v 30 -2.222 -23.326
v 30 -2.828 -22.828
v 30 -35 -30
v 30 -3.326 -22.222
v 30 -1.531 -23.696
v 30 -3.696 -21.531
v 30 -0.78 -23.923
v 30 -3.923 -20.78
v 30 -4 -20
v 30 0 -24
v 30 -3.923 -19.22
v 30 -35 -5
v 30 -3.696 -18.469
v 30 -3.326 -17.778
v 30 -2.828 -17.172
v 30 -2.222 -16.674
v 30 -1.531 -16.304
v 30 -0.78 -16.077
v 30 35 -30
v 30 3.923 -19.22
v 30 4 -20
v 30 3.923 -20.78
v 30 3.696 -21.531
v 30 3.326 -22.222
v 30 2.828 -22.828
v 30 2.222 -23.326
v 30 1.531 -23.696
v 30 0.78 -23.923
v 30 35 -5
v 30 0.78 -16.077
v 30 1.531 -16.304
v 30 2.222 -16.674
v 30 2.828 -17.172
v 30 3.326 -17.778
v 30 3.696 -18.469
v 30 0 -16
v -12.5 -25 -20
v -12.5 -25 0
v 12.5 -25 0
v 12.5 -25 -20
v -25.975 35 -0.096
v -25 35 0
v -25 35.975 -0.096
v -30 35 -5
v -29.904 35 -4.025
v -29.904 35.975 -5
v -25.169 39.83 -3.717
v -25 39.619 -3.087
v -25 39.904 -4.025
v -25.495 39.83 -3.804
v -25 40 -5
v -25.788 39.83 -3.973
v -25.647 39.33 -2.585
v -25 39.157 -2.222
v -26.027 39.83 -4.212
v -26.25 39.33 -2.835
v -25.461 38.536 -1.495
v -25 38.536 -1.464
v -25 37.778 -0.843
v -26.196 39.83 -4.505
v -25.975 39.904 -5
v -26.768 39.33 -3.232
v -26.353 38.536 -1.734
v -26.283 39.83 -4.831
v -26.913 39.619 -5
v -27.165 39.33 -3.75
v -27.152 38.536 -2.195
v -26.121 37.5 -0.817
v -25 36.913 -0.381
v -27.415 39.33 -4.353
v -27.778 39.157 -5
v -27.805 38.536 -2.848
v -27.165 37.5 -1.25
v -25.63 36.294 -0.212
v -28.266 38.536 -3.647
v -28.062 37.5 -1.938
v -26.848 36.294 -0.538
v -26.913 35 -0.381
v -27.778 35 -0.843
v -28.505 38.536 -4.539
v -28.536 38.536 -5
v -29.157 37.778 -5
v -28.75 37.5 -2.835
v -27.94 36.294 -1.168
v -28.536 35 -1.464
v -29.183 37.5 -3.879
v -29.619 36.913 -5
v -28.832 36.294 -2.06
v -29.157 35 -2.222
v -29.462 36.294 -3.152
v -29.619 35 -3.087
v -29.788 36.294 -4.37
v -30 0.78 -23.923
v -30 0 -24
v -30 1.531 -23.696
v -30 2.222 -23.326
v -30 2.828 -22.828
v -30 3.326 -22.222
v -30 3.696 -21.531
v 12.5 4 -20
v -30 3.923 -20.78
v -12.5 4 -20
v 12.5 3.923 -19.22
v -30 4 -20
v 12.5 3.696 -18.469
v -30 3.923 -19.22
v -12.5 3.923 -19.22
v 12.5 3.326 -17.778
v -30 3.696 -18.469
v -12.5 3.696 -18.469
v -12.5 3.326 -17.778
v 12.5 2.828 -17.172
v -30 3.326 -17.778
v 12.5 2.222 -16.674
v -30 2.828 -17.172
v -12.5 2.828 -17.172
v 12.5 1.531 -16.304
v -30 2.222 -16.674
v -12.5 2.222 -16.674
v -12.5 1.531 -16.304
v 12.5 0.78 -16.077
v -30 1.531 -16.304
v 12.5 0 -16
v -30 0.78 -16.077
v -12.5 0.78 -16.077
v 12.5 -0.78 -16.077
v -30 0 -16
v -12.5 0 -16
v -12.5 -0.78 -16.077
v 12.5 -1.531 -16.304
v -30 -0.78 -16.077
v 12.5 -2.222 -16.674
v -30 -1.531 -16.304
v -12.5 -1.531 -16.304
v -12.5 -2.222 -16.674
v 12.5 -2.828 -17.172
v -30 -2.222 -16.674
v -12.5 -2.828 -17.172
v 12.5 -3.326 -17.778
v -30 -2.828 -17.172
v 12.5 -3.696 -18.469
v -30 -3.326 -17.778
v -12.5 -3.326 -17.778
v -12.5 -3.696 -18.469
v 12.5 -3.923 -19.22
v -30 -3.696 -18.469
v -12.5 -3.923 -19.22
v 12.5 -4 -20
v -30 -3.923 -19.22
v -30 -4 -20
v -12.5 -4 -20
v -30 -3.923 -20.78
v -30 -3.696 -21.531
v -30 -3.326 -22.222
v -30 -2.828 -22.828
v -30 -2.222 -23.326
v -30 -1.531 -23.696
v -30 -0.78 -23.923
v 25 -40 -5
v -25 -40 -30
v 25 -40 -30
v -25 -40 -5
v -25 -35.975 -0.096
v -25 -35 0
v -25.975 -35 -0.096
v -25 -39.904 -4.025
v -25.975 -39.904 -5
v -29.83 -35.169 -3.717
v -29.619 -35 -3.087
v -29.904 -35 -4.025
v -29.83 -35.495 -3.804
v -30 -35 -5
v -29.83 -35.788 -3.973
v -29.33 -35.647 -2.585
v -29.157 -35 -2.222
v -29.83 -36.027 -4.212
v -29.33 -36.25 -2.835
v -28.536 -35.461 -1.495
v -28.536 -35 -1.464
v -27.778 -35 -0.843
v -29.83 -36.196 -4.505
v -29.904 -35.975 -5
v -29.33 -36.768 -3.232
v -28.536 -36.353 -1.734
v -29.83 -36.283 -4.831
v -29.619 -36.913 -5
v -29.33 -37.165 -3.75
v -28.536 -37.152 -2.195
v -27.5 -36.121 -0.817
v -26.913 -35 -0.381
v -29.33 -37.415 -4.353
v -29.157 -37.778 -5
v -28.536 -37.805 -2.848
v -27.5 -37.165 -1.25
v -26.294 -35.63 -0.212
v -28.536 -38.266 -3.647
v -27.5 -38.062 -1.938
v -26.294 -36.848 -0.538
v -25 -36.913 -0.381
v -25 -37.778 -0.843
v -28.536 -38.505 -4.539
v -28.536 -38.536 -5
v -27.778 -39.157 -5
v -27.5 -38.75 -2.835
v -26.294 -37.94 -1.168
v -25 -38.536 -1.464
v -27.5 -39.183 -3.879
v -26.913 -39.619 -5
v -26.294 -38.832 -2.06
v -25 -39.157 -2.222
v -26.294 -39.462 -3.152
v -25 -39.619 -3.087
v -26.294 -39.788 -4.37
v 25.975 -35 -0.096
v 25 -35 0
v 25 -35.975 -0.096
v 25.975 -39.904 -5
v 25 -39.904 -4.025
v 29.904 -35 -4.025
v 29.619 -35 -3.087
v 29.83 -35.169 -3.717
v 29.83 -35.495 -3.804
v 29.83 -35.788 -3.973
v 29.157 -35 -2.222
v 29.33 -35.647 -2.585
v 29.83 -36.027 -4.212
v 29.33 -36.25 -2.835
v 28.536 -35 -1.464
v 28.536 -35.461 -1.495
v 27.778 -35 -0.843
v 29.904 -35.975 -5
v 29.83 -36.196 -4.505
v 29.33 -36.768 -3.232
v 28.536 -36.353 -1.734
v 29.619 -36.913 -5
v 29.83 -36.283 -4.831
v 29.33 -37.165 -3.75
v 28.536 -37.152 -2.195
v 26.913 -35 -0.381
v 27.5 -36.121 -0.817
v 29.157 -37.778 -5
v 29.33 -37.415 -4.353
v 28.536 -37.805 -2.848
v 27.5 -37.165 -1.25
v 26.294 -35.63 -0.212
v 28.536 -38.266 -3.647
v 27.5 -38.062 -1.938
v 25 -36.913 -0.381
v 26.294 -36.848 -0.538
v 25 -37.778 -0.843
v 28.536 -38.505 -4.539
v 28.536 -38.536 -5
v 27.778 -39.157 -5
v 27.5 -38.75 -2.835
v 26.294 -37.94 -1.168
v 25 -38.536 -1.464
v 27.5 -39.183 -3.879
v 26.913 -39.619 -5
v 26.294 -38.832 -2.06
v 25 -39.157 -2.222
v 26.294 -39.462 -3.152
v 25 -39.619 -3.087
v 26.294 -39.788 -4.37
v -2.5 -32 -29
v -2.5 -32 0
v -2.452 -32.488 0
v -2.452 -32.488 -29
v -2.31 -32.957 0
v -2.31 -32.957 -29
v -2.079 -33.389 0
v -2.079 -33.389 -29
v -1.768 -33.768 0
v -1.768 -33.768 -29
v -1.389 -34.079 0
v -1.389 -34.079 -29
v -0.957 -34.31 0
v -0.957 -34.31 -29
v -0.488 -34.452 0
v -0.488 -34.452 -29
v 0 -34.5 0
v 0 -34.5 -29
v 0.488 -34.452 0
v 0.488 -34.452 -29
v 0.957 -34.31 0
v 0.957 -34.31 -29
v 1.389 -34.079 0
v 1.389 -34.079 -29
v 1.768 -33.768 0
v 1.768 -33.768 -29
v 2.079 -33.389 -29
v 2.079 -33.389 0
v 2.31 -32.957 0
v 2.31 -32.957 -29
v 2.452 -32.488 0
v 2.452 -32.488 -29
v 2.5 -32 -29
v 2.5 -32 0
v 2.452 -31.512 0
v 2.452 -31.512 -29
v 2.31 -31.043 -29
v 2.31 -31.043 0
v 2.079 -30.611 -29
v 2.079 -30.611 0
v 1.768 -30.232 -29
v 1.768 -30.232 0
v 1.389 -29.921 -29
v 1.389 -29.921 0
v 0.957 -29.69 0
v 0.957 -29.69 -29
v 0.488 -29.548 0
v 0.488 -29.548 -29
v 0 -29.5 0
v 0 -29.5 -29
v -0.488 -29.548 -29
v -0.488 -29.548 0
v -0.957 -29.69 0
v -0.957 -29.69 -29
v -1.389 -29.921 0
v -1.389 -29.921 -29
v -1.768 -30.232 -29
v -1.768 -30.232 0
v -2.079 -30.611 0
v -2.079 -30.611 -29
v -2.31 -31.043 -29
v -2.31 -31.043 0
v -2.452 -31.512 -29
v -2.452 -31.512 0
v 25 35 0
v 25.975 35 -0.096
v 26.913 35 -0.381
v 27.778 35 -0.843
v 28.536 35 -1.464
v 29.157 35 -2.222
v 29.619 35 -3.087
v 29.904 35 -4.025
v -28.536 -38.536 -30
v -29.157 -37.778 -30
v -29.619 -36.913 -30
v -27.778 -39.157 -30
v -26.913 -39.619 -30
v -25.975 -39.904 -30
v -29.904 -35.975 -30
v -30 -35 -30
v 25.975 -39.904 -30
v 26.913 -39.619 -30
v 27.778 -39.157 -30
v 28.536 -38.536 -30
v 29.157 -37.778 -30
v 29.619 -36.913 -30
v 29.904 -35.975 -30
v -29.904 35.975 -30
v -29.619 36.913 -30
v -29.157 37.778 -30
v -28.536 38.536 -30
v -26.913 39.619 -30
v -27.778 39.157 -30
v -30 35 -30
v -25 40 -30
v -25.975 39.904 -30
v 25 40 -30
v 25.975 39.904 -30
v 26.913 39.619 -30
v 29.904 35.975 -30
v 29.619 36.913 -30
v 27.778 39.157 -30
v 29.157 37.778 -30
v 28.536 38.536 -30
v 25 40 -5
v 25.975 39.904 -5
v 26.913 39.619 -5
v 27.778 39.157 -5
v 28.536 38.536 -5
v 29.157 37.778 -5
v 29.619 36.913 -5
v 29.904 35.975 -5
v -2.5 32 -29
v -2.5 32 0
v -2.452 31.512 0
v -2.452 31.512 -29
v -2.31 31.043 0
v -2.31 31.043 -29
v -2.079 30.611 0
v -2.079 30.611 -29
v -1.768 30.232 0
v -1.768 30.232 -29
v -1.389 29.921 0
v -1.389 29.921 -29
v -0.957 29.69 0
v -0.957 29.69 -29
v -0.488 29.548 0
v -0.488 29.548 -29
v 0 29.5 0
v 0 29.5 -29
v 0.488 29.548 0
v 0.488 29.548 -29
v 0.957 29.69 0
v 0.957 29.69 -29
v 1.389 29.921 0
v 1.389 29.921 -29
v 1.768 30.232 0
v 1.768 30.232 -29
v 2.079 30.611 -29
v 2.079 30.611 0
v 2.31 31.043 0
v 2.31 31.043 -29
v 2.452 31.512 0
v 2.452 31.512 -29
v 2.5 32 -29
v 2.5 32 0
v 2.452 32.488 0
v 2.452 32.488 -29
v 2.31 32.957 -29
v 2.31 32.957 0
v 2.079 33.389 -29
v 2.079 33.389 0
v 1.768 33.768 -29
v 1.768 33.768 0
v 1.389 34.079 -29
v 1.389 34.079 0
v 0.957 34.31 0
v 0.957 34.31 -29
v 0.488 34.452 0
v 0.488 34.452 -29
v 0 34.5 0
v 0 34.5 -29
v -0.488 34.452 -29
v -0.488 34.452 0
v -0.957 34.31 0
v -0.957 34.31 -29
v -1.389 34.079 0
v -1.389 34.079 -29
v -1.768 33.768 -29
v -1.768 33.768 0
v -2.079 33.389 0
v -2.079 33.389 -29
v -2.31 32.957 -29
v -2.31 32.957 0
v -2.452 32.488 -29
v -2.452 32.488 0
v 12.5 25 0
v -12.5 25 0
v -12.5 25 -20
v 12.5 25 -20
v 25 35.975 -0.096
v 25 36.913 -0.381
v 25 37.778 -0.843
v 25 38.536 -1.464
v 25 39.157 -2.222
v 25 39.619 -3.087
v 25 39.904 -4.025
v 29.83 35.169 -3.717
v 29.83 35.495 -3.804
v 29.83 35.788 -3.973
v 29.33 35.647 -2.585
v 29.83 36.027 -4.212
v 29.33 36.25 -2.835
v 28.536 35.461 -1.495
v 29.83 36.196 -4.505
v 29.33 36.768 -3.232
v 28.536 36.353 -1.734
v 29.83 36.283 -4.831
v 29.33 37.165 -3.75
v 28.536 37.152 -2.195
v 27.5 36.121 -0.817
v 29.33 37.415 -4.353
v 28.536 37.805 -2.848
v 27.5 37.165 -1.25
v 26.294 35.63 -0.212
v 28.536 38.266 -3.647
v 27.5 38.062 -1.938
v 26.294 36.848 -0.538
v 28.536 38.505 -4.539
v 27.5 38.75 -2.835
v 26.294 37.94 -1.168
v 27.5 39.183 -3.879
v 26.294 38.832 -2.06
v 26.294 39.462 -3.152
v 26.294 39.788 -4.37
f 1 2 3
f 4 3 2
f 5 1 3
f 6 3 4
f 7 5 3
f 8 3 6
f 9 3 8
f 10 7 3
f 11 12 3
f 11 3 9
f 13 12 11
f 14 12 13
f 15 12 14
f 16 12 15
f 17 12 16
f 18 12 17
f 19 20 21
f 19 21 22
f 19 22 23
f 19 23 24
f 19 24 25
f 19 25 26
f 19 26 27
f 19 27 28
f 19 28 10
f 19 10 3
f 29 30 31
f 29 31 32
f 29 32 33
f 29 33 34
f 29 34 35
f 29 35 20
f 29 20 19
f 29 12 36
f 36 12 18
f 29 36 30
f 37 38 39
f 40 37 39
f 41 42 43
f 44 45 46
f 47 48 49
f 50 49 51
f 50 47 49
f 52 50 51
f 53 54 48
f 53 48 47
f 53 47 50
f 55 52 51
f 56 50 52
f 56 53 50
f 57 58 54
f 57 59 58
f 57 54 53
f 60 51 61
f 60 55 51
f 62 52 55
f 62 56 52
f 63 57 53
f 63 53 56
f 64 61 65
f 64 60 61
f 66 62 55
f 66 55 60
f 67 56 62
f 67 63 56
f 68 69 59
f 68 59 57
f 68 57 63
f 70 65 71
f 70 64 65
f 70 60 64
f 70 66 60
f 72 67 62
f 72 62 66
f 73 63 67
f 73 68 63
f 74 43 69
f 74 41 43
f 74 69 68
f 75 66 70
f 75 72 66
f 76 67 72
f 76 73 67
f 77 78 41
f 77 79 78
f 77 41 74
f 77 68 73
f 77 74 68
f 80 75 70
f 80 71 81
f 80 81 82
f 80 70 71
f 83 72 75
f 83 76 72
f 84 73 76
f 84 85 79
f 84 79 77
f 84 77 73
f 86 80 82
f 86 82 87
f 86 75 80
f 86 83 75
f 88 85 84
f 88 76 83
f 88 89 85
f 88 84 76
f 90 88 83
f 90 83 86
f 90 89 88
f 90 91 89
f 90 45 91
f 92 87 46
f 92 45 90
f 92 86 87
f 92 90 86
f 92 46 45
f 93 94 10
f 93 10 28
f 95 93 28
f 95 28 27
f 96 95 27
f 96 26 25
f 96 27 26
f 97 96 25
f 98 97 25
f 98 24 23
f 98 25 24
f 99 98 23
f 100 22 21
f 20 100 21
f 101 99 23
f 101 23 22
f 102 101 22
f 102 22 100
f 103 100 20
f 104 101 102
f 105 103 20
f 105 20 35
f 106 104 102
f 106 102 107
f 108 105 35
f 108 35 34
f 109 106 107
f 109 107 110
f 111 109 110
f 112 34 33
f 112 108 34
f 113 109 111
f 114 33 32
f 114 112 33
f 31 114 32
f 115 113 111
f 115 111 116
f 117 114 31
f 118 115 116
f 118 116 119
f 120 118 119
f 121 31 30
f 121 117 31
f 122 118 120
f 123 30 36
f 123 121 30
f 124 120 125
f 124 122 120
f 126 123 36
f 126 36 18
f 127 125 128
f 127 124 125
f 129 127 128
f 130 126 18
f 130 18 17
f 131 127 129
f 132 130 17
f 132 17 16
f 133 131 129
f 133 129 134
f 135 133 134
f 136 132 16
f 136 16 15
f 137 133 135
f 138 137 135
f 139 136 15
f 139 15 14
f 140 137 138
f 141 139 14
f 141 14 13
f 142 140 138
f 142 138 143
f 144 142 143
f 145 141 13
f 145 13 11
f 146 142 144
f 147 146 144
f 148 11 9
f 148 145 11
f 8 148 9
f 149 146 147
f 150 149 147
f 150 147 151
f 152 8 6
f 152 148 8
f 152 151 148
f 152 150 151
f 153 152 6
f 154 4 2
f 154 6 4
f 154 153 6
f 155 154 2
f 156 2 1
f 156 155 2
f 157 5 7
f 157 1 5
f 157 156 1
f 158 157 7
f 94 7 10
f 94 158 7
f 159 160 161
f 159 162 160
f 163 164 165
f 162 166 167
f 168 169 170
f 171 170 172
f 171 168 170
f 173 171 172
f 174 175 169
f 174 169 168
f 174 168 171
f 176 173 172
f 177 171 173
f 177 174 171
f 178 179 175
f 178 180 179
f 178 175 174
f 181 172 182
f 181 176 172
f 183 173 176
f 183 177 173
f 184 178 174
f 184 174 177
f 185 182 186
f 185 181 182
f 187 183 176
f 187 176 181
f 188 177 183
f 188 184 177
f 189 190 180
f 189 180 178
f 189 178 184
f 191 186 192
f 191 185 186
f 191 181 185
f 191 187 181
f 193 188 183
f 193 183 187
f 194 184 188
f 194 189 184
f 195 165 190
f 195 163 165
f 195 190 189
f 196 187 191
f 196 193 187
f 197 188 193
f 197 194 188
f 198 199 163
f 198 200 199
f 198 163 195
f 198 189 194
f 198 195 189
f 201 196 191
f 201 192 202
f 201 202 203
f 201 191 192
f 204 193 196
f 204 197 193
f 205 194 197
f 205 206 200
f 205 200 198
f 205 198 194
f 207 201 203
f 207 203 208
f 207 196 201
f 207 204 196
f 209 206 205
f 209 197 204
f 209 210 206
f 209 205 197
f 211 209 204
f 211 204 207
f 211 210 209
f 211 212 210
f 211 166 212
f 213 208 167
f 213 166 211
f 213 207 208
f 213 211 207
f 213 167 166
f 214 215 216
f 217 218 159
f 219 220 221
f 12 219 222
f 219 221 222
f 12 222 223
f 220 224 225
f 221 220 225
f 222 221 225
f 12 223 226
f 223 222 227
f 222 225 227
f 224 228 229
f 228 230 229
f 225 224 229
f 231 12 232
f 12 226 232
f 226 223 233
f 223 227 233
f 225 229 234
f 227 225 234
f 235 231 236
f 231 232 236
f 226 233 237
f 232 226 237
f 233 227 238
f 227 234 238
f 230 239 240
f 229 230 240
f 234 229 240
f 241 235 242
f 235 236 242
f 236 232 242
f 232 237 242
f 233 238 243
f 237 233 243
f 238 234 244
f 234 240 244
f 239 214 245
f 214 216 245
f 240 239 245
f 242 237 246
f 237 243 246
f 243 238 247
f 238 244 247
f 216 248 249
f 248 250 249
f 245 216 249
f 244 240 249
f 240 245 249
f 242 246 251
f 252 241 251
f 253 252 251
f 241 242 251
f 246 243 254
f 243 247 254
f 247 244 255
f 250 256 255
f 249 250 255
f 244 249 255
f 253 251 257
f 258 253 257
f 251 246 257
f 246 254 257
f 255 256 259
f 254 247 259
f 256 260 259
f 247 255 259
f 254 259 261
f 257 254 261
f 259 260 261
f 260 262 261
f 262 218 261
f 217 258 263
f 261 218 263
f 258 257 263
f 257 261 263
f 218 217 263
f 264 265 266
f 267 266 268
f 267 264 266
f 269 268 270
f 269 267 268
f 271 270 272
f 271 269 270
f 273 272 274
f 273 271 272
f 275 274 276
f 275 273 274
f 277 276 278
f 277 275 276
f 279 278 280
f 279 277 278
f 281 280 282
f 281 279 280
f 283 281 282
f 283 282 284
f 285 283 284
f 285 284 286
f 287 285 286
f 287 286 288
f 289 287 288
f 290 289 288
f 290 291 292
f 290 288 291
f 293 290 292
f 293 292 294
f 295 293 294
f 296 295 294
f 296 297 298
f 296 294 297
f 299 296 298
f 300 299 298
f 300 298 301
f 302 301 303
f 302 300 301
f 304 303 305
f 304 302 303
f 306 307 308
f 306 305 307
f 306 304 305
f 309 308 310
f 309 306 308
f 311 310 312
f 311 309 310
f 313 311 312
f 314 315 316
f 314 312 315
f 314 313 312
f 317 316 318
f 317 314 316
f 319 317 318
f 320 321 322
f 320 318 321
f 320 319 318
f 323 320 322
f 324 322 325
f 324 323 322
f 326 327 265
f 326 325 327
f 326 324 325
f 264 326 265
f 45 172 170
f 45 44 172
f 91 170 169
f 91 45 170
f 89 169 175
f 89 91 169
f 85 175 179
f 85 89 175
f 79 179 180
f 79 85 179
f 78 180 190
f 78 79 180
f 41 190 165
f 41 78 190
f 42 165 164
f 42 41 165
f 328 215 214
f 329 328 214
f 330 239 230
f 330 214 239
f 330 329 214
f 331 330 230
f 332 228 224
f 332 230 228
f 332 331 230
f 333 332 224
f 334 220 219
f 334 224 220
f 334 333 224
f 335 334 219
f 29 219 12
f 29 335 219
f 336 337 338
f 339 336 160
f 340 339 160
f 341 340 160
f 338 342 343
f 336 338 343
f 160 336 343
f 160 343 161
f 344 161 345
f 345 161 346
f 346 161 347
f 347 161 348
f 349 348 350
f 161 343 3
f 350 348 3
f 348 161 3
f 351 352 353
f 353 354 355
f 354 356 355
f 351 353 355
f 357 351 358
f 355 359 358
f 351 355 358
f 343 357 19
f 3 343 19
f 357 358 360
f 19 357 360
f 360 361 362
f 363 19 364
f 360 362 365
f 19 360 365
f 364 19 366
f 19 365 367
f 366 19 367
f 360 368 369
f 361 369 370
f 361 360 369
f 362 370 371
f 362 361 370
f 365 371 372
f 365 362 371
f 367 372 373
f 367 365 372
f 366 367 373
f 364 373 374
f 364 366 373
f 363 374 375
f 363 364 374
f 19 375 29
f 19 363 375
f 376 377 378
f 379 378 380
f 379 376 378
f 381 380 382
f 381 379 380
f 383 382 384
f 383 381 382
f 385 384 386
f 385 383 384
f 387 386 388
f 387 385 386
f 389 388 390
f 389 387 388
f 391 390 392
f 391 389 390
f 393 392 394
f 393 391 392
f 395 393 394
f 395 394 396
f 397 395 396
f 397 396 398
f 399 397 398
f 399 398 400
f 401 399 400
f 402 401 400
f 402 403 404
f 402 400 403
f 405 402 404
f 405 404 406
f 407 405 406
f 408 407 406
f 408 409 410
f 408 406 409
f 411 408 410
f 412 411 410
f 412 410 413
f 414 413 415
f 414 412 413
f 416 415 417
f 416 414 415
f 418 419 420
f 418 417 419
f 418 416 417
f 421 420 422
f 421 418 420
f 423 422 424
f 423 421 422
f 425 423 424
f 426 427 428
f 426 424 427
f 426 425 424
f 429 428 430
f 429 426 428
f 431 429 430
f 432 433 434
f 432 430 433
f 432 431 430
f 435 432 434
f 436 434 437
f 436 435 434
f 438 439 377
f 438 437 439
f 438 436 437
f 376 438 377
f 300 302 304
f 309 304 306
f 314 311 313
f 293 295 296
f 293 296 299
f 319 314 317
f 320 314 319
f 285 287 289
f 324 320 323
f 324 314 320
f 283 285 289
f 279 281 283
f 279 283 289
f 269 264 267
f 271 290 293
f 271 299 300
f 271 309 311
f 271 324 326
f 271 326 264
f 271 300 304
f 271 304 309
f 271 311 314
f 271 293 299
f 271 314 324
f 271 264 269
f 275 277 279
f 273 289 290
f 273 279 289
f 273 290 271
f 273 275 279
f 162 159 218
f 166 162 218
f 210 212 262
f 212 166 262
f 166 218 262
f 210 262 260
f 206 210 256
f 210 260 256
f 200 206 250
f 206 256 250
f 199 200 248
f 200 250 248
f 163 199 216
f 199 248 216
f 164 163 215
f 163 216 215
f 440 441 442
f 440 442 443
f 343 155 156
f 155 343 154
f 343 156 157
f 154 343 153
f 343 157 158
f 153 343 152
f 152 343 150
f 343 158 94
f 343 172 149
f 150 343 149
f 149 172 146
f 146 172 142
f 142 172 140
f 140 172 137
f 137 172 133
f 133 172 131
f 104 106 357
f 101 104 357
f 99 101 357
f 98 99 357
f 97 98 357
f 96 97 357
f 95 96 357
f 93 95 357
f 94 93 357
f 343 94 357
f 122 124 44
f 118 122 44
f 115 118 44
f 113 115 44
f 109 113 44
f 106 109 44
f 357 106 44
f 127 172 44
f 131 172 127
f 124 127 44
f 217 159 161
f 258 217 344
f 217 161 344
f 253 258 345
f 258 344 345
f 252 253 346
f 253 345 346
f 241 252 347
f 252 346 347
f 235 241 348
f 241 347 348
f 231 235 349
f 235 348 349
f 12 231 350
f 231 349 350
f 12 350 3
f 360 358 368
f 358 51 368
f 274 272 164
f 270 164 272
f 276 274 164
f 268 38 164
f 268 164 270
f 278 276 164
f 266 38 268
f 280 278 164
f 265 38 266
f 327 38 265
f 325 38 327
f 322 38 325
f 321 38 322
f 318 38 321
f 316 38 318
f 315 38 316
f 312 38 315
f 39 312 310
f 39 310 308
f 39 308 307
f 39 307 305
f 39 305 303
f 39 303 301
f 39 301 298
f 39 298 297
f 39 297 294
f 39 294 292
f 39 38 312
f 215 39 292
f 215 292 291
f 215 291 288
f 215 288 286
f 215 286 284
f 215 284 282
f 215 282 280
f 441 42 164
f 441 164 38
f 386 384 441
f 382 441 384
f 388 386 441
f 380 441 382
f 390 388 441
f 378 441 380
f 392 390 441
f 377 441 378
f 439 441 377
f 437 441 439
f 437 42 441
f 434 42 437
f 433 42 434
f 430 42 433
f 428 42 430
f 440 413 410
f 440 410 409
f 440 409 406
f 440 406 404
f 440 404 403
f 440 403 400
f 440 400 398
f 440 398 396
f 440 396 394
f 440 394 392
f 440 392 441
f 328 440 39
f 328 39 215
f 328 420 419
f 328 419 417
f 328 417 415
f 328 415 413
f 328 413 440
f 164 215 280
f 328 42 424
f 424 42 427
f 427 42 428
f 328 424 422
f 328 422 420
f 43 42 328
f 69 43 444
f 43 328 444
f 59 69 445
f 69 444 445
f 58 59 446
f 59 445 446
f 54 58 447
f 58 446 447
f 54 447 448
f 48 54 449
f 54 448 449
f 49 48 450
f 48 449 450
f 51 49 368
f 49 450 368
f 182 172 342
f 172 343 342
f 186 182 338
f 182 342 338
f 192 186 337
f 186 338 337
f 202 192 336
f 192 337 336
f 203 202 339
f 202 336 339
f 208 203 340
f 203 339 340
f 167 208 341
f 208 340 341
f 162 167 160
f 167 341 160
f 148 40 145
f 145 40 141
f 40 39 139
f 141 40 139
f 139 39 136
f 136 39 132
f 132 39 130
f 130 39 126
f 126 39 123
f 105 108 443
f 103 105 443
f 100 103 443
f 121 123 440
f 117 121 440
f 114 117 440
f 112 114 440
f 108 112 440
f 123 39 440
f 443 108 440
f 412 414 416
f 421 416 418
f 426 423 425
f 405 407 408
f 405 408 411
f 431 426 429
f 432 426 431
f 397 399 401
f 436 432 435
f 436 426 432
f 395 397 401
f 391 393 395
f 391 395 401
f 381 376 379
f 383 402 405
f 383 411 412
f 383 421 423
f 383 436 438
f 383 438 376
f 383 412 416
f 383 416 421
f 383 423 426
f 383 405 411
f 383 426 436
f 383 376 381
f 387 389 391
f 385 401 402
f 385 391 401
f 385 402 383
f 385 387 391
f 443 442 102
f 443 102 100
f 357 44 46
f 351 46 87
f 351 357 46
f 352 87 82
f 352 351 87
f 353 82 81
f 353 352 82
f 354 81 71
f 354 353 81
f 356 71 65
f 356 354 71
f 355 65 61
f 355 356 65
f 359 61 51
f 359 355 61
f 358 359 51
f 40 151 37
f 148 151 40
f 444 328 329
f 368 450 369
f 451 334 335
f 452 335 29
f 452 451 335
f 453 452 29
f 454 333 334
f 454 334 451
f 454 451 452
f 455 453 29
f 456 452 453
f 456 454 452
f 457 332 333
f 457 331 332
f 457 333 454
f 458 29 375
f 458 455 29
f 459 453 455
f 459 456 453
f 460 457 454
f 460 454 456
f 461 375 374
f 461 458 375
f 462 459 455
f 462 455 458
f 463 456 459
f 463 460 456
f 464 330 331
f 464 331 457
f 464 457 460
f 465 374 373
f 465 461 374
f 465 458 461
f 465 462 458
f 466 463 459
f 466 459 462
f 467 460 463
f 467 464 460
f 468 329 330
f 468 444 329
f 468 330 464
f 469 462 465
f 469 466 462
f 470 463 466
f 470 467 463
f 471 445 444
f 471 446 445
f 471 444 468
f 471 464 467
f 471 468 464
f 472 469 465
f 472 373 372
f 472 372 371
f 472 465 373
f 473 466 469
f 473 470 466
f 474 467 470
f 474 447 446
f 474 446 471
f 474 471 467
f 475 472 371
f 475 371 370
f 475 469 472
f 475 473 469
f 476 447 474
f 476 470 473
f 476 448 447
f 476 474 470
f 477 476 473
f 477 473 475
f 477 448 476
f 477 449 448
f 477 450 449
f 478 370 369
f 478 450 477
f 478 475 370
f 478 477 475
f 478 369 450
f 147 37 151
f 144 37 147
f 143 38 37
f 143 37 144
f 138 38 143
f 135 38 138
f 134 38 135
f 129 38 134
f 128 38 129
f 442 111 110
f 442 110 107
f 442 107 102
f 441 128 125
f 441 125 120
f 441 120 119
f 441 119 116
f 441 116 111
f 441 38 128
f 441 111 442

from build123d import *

# Parameters (mm, degrees)
SKETCH1_W               = 60
SKETCH1_H               = 80
BOSS_EXTRUDE1_DEPTH     = 30
SKETCH2_W               = 25
SKETCH2_H               = 50
CUT_EXTRUDE1_DEPTH      = 20
CUT_EXTRUDE3_DEPTH      = 59.309518948
CUT_EXTRUDE3_DEPTH_BACK = 59.309518948
SKETCH4_R               = 4
CUT_EXTRUDE4_DEPTH      = 59.309518948
CUT_EXTRUDE4_DEPTH_BACK = 29
SKETCH5_R               = 2.5
FILLET1_R               = 5


with BuildPart() as part:
    # Sketch1 → Boss-Extrude1 (new body)
    with BuildSketch(Plane.XY):
        Rectangle(SKETCH1_W, SKETCH1_H)
    extrude(amount=-BOSS_EXTRUDE1_DEPTH)

    # Sketch2 → Cut-Extrude1 (cut)
    with BuildSketch(Plane.XY):
        Rectangle(SKETCH2_W, SKETCH2_H)
    extrude(amount=-CUT_EXTRUDE1_DEPTH, mode=Mode.SUBTRACT)

    # Sketch4 → Cut-Extrude3 (cut, two sides: drawn at the far end of the back side and taken through both)
    with BuildSketch(Plane(origin=(0, 0, 0), x_dir=(0, 0, -1), z_dir=(1, 0, 0)).offset(-CUT_EXTRUDE3_DEPTH_BACK)):
        with Locations((20, 0)):
            Circle(SKETCH4_R)
    extrude(amount=CUT_EXTRUDE3_DEPTH + CUT_EXTRUDE3_DEPTH_BACK, mode=Mode.SUBTRACT)

    # Sketch5 → Cut-Extrude4 (cut, two sides: drawn at the far end of the back side and taken through both)
    with BuildSketch(Plane.XY.offset(-CUT_EXTRUDE4_DEPTH_BACK)):
        with Locations(Location((0, 32, 0), (0, 0, 180))):
            Circle(SKETCH5_R)
        with Locations(Location((0, -32, 0), (0, 0, 180))):
            Circle(SKETCH5_R)
    extrude(amount=CUT_EXTRUDE4_DEPTH + CUT_EXTRUDE4_DEPTH_BACK, mode=Mode.SUBTRACT)

    # Fillet1
    fillet1_edges = [part.edges().sort_by_distance(p)[0] for p in [
        (0, -40, 0),
        (-30, 0, 0),
        (0, 40, 0),
        (30, 0, 0),
        (30, -40, -15),
        (-30, -40, -15),
        (-30, 40, -15),
        (30, 40, -15),
    ]]
    fillet(fillet1_edges, radius=FILLET1_R)


solid = part.part
